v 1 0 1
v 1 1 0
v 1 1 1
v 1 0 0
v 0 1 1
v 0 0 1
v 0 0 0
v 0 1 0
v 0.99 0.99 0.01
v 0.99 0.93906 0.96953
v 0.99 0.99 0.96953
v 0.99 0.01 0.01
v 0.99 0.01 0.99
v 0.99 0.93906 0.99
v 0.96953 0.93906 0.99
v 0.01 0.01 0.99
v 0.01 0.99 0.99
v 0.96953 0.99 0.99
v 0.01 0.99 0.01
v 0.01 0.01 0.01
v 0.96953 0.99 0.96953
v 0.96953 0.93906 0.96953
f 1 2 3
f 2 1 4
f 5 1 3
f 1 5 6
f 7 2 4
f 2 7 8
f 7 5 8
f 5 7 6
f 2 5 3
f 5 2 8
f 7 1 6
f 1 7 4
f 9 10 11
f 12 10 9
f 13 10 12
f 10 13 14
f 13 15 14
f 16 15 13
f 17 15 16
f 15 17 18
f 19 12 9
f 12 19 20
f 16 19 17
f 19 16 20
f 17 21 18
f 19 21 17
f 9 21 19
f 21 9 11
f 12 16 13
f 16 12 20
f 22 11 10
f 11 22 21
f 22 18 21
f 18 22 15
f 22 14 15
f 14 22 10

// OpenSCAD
translate([0.984375, 0.96875, 0.984375]) color([0.016540899859545988, 0.2649906914184337, 0.6195666266963675]) cube([0.0296875, 0.059375, 0.0296875], center=true);
translate([0.984375, 0.96875, 0.984375]) color([0.9400622663204184, 0.8580807518186289, 0.33004078082379396]) cube([0.0296875, 0.059375, 0.0296875], center=true);
translate([0.984375, 0.96875, 0.984375]) color([0.9838273149753736, 0.1297919343219498, 0.6092048694604357]) cube([0.0296875, 0.059375, 0.0296875], center=true);
translate([0.984375, 0.96875, 0.984375]) color([0.4362496777237921, 0.204876863896859, 0.7703581377154641]) cube([0.0296875, 0.059375, 0.0296875], center=true);
translate([0.984375, 0.96875, 0.984375]) color([0.24016059236570497, 0.9925708955515705, 0.45030012798788]) cube([0.0296875, 0.059375, 0.0296875], center=true);
color([0.3,0.3,0.3,0.3]) difference() { cube([1,1,1]); translate([0.01,0.01,0.01]) cube([0.98,0.98,0.98]); }
